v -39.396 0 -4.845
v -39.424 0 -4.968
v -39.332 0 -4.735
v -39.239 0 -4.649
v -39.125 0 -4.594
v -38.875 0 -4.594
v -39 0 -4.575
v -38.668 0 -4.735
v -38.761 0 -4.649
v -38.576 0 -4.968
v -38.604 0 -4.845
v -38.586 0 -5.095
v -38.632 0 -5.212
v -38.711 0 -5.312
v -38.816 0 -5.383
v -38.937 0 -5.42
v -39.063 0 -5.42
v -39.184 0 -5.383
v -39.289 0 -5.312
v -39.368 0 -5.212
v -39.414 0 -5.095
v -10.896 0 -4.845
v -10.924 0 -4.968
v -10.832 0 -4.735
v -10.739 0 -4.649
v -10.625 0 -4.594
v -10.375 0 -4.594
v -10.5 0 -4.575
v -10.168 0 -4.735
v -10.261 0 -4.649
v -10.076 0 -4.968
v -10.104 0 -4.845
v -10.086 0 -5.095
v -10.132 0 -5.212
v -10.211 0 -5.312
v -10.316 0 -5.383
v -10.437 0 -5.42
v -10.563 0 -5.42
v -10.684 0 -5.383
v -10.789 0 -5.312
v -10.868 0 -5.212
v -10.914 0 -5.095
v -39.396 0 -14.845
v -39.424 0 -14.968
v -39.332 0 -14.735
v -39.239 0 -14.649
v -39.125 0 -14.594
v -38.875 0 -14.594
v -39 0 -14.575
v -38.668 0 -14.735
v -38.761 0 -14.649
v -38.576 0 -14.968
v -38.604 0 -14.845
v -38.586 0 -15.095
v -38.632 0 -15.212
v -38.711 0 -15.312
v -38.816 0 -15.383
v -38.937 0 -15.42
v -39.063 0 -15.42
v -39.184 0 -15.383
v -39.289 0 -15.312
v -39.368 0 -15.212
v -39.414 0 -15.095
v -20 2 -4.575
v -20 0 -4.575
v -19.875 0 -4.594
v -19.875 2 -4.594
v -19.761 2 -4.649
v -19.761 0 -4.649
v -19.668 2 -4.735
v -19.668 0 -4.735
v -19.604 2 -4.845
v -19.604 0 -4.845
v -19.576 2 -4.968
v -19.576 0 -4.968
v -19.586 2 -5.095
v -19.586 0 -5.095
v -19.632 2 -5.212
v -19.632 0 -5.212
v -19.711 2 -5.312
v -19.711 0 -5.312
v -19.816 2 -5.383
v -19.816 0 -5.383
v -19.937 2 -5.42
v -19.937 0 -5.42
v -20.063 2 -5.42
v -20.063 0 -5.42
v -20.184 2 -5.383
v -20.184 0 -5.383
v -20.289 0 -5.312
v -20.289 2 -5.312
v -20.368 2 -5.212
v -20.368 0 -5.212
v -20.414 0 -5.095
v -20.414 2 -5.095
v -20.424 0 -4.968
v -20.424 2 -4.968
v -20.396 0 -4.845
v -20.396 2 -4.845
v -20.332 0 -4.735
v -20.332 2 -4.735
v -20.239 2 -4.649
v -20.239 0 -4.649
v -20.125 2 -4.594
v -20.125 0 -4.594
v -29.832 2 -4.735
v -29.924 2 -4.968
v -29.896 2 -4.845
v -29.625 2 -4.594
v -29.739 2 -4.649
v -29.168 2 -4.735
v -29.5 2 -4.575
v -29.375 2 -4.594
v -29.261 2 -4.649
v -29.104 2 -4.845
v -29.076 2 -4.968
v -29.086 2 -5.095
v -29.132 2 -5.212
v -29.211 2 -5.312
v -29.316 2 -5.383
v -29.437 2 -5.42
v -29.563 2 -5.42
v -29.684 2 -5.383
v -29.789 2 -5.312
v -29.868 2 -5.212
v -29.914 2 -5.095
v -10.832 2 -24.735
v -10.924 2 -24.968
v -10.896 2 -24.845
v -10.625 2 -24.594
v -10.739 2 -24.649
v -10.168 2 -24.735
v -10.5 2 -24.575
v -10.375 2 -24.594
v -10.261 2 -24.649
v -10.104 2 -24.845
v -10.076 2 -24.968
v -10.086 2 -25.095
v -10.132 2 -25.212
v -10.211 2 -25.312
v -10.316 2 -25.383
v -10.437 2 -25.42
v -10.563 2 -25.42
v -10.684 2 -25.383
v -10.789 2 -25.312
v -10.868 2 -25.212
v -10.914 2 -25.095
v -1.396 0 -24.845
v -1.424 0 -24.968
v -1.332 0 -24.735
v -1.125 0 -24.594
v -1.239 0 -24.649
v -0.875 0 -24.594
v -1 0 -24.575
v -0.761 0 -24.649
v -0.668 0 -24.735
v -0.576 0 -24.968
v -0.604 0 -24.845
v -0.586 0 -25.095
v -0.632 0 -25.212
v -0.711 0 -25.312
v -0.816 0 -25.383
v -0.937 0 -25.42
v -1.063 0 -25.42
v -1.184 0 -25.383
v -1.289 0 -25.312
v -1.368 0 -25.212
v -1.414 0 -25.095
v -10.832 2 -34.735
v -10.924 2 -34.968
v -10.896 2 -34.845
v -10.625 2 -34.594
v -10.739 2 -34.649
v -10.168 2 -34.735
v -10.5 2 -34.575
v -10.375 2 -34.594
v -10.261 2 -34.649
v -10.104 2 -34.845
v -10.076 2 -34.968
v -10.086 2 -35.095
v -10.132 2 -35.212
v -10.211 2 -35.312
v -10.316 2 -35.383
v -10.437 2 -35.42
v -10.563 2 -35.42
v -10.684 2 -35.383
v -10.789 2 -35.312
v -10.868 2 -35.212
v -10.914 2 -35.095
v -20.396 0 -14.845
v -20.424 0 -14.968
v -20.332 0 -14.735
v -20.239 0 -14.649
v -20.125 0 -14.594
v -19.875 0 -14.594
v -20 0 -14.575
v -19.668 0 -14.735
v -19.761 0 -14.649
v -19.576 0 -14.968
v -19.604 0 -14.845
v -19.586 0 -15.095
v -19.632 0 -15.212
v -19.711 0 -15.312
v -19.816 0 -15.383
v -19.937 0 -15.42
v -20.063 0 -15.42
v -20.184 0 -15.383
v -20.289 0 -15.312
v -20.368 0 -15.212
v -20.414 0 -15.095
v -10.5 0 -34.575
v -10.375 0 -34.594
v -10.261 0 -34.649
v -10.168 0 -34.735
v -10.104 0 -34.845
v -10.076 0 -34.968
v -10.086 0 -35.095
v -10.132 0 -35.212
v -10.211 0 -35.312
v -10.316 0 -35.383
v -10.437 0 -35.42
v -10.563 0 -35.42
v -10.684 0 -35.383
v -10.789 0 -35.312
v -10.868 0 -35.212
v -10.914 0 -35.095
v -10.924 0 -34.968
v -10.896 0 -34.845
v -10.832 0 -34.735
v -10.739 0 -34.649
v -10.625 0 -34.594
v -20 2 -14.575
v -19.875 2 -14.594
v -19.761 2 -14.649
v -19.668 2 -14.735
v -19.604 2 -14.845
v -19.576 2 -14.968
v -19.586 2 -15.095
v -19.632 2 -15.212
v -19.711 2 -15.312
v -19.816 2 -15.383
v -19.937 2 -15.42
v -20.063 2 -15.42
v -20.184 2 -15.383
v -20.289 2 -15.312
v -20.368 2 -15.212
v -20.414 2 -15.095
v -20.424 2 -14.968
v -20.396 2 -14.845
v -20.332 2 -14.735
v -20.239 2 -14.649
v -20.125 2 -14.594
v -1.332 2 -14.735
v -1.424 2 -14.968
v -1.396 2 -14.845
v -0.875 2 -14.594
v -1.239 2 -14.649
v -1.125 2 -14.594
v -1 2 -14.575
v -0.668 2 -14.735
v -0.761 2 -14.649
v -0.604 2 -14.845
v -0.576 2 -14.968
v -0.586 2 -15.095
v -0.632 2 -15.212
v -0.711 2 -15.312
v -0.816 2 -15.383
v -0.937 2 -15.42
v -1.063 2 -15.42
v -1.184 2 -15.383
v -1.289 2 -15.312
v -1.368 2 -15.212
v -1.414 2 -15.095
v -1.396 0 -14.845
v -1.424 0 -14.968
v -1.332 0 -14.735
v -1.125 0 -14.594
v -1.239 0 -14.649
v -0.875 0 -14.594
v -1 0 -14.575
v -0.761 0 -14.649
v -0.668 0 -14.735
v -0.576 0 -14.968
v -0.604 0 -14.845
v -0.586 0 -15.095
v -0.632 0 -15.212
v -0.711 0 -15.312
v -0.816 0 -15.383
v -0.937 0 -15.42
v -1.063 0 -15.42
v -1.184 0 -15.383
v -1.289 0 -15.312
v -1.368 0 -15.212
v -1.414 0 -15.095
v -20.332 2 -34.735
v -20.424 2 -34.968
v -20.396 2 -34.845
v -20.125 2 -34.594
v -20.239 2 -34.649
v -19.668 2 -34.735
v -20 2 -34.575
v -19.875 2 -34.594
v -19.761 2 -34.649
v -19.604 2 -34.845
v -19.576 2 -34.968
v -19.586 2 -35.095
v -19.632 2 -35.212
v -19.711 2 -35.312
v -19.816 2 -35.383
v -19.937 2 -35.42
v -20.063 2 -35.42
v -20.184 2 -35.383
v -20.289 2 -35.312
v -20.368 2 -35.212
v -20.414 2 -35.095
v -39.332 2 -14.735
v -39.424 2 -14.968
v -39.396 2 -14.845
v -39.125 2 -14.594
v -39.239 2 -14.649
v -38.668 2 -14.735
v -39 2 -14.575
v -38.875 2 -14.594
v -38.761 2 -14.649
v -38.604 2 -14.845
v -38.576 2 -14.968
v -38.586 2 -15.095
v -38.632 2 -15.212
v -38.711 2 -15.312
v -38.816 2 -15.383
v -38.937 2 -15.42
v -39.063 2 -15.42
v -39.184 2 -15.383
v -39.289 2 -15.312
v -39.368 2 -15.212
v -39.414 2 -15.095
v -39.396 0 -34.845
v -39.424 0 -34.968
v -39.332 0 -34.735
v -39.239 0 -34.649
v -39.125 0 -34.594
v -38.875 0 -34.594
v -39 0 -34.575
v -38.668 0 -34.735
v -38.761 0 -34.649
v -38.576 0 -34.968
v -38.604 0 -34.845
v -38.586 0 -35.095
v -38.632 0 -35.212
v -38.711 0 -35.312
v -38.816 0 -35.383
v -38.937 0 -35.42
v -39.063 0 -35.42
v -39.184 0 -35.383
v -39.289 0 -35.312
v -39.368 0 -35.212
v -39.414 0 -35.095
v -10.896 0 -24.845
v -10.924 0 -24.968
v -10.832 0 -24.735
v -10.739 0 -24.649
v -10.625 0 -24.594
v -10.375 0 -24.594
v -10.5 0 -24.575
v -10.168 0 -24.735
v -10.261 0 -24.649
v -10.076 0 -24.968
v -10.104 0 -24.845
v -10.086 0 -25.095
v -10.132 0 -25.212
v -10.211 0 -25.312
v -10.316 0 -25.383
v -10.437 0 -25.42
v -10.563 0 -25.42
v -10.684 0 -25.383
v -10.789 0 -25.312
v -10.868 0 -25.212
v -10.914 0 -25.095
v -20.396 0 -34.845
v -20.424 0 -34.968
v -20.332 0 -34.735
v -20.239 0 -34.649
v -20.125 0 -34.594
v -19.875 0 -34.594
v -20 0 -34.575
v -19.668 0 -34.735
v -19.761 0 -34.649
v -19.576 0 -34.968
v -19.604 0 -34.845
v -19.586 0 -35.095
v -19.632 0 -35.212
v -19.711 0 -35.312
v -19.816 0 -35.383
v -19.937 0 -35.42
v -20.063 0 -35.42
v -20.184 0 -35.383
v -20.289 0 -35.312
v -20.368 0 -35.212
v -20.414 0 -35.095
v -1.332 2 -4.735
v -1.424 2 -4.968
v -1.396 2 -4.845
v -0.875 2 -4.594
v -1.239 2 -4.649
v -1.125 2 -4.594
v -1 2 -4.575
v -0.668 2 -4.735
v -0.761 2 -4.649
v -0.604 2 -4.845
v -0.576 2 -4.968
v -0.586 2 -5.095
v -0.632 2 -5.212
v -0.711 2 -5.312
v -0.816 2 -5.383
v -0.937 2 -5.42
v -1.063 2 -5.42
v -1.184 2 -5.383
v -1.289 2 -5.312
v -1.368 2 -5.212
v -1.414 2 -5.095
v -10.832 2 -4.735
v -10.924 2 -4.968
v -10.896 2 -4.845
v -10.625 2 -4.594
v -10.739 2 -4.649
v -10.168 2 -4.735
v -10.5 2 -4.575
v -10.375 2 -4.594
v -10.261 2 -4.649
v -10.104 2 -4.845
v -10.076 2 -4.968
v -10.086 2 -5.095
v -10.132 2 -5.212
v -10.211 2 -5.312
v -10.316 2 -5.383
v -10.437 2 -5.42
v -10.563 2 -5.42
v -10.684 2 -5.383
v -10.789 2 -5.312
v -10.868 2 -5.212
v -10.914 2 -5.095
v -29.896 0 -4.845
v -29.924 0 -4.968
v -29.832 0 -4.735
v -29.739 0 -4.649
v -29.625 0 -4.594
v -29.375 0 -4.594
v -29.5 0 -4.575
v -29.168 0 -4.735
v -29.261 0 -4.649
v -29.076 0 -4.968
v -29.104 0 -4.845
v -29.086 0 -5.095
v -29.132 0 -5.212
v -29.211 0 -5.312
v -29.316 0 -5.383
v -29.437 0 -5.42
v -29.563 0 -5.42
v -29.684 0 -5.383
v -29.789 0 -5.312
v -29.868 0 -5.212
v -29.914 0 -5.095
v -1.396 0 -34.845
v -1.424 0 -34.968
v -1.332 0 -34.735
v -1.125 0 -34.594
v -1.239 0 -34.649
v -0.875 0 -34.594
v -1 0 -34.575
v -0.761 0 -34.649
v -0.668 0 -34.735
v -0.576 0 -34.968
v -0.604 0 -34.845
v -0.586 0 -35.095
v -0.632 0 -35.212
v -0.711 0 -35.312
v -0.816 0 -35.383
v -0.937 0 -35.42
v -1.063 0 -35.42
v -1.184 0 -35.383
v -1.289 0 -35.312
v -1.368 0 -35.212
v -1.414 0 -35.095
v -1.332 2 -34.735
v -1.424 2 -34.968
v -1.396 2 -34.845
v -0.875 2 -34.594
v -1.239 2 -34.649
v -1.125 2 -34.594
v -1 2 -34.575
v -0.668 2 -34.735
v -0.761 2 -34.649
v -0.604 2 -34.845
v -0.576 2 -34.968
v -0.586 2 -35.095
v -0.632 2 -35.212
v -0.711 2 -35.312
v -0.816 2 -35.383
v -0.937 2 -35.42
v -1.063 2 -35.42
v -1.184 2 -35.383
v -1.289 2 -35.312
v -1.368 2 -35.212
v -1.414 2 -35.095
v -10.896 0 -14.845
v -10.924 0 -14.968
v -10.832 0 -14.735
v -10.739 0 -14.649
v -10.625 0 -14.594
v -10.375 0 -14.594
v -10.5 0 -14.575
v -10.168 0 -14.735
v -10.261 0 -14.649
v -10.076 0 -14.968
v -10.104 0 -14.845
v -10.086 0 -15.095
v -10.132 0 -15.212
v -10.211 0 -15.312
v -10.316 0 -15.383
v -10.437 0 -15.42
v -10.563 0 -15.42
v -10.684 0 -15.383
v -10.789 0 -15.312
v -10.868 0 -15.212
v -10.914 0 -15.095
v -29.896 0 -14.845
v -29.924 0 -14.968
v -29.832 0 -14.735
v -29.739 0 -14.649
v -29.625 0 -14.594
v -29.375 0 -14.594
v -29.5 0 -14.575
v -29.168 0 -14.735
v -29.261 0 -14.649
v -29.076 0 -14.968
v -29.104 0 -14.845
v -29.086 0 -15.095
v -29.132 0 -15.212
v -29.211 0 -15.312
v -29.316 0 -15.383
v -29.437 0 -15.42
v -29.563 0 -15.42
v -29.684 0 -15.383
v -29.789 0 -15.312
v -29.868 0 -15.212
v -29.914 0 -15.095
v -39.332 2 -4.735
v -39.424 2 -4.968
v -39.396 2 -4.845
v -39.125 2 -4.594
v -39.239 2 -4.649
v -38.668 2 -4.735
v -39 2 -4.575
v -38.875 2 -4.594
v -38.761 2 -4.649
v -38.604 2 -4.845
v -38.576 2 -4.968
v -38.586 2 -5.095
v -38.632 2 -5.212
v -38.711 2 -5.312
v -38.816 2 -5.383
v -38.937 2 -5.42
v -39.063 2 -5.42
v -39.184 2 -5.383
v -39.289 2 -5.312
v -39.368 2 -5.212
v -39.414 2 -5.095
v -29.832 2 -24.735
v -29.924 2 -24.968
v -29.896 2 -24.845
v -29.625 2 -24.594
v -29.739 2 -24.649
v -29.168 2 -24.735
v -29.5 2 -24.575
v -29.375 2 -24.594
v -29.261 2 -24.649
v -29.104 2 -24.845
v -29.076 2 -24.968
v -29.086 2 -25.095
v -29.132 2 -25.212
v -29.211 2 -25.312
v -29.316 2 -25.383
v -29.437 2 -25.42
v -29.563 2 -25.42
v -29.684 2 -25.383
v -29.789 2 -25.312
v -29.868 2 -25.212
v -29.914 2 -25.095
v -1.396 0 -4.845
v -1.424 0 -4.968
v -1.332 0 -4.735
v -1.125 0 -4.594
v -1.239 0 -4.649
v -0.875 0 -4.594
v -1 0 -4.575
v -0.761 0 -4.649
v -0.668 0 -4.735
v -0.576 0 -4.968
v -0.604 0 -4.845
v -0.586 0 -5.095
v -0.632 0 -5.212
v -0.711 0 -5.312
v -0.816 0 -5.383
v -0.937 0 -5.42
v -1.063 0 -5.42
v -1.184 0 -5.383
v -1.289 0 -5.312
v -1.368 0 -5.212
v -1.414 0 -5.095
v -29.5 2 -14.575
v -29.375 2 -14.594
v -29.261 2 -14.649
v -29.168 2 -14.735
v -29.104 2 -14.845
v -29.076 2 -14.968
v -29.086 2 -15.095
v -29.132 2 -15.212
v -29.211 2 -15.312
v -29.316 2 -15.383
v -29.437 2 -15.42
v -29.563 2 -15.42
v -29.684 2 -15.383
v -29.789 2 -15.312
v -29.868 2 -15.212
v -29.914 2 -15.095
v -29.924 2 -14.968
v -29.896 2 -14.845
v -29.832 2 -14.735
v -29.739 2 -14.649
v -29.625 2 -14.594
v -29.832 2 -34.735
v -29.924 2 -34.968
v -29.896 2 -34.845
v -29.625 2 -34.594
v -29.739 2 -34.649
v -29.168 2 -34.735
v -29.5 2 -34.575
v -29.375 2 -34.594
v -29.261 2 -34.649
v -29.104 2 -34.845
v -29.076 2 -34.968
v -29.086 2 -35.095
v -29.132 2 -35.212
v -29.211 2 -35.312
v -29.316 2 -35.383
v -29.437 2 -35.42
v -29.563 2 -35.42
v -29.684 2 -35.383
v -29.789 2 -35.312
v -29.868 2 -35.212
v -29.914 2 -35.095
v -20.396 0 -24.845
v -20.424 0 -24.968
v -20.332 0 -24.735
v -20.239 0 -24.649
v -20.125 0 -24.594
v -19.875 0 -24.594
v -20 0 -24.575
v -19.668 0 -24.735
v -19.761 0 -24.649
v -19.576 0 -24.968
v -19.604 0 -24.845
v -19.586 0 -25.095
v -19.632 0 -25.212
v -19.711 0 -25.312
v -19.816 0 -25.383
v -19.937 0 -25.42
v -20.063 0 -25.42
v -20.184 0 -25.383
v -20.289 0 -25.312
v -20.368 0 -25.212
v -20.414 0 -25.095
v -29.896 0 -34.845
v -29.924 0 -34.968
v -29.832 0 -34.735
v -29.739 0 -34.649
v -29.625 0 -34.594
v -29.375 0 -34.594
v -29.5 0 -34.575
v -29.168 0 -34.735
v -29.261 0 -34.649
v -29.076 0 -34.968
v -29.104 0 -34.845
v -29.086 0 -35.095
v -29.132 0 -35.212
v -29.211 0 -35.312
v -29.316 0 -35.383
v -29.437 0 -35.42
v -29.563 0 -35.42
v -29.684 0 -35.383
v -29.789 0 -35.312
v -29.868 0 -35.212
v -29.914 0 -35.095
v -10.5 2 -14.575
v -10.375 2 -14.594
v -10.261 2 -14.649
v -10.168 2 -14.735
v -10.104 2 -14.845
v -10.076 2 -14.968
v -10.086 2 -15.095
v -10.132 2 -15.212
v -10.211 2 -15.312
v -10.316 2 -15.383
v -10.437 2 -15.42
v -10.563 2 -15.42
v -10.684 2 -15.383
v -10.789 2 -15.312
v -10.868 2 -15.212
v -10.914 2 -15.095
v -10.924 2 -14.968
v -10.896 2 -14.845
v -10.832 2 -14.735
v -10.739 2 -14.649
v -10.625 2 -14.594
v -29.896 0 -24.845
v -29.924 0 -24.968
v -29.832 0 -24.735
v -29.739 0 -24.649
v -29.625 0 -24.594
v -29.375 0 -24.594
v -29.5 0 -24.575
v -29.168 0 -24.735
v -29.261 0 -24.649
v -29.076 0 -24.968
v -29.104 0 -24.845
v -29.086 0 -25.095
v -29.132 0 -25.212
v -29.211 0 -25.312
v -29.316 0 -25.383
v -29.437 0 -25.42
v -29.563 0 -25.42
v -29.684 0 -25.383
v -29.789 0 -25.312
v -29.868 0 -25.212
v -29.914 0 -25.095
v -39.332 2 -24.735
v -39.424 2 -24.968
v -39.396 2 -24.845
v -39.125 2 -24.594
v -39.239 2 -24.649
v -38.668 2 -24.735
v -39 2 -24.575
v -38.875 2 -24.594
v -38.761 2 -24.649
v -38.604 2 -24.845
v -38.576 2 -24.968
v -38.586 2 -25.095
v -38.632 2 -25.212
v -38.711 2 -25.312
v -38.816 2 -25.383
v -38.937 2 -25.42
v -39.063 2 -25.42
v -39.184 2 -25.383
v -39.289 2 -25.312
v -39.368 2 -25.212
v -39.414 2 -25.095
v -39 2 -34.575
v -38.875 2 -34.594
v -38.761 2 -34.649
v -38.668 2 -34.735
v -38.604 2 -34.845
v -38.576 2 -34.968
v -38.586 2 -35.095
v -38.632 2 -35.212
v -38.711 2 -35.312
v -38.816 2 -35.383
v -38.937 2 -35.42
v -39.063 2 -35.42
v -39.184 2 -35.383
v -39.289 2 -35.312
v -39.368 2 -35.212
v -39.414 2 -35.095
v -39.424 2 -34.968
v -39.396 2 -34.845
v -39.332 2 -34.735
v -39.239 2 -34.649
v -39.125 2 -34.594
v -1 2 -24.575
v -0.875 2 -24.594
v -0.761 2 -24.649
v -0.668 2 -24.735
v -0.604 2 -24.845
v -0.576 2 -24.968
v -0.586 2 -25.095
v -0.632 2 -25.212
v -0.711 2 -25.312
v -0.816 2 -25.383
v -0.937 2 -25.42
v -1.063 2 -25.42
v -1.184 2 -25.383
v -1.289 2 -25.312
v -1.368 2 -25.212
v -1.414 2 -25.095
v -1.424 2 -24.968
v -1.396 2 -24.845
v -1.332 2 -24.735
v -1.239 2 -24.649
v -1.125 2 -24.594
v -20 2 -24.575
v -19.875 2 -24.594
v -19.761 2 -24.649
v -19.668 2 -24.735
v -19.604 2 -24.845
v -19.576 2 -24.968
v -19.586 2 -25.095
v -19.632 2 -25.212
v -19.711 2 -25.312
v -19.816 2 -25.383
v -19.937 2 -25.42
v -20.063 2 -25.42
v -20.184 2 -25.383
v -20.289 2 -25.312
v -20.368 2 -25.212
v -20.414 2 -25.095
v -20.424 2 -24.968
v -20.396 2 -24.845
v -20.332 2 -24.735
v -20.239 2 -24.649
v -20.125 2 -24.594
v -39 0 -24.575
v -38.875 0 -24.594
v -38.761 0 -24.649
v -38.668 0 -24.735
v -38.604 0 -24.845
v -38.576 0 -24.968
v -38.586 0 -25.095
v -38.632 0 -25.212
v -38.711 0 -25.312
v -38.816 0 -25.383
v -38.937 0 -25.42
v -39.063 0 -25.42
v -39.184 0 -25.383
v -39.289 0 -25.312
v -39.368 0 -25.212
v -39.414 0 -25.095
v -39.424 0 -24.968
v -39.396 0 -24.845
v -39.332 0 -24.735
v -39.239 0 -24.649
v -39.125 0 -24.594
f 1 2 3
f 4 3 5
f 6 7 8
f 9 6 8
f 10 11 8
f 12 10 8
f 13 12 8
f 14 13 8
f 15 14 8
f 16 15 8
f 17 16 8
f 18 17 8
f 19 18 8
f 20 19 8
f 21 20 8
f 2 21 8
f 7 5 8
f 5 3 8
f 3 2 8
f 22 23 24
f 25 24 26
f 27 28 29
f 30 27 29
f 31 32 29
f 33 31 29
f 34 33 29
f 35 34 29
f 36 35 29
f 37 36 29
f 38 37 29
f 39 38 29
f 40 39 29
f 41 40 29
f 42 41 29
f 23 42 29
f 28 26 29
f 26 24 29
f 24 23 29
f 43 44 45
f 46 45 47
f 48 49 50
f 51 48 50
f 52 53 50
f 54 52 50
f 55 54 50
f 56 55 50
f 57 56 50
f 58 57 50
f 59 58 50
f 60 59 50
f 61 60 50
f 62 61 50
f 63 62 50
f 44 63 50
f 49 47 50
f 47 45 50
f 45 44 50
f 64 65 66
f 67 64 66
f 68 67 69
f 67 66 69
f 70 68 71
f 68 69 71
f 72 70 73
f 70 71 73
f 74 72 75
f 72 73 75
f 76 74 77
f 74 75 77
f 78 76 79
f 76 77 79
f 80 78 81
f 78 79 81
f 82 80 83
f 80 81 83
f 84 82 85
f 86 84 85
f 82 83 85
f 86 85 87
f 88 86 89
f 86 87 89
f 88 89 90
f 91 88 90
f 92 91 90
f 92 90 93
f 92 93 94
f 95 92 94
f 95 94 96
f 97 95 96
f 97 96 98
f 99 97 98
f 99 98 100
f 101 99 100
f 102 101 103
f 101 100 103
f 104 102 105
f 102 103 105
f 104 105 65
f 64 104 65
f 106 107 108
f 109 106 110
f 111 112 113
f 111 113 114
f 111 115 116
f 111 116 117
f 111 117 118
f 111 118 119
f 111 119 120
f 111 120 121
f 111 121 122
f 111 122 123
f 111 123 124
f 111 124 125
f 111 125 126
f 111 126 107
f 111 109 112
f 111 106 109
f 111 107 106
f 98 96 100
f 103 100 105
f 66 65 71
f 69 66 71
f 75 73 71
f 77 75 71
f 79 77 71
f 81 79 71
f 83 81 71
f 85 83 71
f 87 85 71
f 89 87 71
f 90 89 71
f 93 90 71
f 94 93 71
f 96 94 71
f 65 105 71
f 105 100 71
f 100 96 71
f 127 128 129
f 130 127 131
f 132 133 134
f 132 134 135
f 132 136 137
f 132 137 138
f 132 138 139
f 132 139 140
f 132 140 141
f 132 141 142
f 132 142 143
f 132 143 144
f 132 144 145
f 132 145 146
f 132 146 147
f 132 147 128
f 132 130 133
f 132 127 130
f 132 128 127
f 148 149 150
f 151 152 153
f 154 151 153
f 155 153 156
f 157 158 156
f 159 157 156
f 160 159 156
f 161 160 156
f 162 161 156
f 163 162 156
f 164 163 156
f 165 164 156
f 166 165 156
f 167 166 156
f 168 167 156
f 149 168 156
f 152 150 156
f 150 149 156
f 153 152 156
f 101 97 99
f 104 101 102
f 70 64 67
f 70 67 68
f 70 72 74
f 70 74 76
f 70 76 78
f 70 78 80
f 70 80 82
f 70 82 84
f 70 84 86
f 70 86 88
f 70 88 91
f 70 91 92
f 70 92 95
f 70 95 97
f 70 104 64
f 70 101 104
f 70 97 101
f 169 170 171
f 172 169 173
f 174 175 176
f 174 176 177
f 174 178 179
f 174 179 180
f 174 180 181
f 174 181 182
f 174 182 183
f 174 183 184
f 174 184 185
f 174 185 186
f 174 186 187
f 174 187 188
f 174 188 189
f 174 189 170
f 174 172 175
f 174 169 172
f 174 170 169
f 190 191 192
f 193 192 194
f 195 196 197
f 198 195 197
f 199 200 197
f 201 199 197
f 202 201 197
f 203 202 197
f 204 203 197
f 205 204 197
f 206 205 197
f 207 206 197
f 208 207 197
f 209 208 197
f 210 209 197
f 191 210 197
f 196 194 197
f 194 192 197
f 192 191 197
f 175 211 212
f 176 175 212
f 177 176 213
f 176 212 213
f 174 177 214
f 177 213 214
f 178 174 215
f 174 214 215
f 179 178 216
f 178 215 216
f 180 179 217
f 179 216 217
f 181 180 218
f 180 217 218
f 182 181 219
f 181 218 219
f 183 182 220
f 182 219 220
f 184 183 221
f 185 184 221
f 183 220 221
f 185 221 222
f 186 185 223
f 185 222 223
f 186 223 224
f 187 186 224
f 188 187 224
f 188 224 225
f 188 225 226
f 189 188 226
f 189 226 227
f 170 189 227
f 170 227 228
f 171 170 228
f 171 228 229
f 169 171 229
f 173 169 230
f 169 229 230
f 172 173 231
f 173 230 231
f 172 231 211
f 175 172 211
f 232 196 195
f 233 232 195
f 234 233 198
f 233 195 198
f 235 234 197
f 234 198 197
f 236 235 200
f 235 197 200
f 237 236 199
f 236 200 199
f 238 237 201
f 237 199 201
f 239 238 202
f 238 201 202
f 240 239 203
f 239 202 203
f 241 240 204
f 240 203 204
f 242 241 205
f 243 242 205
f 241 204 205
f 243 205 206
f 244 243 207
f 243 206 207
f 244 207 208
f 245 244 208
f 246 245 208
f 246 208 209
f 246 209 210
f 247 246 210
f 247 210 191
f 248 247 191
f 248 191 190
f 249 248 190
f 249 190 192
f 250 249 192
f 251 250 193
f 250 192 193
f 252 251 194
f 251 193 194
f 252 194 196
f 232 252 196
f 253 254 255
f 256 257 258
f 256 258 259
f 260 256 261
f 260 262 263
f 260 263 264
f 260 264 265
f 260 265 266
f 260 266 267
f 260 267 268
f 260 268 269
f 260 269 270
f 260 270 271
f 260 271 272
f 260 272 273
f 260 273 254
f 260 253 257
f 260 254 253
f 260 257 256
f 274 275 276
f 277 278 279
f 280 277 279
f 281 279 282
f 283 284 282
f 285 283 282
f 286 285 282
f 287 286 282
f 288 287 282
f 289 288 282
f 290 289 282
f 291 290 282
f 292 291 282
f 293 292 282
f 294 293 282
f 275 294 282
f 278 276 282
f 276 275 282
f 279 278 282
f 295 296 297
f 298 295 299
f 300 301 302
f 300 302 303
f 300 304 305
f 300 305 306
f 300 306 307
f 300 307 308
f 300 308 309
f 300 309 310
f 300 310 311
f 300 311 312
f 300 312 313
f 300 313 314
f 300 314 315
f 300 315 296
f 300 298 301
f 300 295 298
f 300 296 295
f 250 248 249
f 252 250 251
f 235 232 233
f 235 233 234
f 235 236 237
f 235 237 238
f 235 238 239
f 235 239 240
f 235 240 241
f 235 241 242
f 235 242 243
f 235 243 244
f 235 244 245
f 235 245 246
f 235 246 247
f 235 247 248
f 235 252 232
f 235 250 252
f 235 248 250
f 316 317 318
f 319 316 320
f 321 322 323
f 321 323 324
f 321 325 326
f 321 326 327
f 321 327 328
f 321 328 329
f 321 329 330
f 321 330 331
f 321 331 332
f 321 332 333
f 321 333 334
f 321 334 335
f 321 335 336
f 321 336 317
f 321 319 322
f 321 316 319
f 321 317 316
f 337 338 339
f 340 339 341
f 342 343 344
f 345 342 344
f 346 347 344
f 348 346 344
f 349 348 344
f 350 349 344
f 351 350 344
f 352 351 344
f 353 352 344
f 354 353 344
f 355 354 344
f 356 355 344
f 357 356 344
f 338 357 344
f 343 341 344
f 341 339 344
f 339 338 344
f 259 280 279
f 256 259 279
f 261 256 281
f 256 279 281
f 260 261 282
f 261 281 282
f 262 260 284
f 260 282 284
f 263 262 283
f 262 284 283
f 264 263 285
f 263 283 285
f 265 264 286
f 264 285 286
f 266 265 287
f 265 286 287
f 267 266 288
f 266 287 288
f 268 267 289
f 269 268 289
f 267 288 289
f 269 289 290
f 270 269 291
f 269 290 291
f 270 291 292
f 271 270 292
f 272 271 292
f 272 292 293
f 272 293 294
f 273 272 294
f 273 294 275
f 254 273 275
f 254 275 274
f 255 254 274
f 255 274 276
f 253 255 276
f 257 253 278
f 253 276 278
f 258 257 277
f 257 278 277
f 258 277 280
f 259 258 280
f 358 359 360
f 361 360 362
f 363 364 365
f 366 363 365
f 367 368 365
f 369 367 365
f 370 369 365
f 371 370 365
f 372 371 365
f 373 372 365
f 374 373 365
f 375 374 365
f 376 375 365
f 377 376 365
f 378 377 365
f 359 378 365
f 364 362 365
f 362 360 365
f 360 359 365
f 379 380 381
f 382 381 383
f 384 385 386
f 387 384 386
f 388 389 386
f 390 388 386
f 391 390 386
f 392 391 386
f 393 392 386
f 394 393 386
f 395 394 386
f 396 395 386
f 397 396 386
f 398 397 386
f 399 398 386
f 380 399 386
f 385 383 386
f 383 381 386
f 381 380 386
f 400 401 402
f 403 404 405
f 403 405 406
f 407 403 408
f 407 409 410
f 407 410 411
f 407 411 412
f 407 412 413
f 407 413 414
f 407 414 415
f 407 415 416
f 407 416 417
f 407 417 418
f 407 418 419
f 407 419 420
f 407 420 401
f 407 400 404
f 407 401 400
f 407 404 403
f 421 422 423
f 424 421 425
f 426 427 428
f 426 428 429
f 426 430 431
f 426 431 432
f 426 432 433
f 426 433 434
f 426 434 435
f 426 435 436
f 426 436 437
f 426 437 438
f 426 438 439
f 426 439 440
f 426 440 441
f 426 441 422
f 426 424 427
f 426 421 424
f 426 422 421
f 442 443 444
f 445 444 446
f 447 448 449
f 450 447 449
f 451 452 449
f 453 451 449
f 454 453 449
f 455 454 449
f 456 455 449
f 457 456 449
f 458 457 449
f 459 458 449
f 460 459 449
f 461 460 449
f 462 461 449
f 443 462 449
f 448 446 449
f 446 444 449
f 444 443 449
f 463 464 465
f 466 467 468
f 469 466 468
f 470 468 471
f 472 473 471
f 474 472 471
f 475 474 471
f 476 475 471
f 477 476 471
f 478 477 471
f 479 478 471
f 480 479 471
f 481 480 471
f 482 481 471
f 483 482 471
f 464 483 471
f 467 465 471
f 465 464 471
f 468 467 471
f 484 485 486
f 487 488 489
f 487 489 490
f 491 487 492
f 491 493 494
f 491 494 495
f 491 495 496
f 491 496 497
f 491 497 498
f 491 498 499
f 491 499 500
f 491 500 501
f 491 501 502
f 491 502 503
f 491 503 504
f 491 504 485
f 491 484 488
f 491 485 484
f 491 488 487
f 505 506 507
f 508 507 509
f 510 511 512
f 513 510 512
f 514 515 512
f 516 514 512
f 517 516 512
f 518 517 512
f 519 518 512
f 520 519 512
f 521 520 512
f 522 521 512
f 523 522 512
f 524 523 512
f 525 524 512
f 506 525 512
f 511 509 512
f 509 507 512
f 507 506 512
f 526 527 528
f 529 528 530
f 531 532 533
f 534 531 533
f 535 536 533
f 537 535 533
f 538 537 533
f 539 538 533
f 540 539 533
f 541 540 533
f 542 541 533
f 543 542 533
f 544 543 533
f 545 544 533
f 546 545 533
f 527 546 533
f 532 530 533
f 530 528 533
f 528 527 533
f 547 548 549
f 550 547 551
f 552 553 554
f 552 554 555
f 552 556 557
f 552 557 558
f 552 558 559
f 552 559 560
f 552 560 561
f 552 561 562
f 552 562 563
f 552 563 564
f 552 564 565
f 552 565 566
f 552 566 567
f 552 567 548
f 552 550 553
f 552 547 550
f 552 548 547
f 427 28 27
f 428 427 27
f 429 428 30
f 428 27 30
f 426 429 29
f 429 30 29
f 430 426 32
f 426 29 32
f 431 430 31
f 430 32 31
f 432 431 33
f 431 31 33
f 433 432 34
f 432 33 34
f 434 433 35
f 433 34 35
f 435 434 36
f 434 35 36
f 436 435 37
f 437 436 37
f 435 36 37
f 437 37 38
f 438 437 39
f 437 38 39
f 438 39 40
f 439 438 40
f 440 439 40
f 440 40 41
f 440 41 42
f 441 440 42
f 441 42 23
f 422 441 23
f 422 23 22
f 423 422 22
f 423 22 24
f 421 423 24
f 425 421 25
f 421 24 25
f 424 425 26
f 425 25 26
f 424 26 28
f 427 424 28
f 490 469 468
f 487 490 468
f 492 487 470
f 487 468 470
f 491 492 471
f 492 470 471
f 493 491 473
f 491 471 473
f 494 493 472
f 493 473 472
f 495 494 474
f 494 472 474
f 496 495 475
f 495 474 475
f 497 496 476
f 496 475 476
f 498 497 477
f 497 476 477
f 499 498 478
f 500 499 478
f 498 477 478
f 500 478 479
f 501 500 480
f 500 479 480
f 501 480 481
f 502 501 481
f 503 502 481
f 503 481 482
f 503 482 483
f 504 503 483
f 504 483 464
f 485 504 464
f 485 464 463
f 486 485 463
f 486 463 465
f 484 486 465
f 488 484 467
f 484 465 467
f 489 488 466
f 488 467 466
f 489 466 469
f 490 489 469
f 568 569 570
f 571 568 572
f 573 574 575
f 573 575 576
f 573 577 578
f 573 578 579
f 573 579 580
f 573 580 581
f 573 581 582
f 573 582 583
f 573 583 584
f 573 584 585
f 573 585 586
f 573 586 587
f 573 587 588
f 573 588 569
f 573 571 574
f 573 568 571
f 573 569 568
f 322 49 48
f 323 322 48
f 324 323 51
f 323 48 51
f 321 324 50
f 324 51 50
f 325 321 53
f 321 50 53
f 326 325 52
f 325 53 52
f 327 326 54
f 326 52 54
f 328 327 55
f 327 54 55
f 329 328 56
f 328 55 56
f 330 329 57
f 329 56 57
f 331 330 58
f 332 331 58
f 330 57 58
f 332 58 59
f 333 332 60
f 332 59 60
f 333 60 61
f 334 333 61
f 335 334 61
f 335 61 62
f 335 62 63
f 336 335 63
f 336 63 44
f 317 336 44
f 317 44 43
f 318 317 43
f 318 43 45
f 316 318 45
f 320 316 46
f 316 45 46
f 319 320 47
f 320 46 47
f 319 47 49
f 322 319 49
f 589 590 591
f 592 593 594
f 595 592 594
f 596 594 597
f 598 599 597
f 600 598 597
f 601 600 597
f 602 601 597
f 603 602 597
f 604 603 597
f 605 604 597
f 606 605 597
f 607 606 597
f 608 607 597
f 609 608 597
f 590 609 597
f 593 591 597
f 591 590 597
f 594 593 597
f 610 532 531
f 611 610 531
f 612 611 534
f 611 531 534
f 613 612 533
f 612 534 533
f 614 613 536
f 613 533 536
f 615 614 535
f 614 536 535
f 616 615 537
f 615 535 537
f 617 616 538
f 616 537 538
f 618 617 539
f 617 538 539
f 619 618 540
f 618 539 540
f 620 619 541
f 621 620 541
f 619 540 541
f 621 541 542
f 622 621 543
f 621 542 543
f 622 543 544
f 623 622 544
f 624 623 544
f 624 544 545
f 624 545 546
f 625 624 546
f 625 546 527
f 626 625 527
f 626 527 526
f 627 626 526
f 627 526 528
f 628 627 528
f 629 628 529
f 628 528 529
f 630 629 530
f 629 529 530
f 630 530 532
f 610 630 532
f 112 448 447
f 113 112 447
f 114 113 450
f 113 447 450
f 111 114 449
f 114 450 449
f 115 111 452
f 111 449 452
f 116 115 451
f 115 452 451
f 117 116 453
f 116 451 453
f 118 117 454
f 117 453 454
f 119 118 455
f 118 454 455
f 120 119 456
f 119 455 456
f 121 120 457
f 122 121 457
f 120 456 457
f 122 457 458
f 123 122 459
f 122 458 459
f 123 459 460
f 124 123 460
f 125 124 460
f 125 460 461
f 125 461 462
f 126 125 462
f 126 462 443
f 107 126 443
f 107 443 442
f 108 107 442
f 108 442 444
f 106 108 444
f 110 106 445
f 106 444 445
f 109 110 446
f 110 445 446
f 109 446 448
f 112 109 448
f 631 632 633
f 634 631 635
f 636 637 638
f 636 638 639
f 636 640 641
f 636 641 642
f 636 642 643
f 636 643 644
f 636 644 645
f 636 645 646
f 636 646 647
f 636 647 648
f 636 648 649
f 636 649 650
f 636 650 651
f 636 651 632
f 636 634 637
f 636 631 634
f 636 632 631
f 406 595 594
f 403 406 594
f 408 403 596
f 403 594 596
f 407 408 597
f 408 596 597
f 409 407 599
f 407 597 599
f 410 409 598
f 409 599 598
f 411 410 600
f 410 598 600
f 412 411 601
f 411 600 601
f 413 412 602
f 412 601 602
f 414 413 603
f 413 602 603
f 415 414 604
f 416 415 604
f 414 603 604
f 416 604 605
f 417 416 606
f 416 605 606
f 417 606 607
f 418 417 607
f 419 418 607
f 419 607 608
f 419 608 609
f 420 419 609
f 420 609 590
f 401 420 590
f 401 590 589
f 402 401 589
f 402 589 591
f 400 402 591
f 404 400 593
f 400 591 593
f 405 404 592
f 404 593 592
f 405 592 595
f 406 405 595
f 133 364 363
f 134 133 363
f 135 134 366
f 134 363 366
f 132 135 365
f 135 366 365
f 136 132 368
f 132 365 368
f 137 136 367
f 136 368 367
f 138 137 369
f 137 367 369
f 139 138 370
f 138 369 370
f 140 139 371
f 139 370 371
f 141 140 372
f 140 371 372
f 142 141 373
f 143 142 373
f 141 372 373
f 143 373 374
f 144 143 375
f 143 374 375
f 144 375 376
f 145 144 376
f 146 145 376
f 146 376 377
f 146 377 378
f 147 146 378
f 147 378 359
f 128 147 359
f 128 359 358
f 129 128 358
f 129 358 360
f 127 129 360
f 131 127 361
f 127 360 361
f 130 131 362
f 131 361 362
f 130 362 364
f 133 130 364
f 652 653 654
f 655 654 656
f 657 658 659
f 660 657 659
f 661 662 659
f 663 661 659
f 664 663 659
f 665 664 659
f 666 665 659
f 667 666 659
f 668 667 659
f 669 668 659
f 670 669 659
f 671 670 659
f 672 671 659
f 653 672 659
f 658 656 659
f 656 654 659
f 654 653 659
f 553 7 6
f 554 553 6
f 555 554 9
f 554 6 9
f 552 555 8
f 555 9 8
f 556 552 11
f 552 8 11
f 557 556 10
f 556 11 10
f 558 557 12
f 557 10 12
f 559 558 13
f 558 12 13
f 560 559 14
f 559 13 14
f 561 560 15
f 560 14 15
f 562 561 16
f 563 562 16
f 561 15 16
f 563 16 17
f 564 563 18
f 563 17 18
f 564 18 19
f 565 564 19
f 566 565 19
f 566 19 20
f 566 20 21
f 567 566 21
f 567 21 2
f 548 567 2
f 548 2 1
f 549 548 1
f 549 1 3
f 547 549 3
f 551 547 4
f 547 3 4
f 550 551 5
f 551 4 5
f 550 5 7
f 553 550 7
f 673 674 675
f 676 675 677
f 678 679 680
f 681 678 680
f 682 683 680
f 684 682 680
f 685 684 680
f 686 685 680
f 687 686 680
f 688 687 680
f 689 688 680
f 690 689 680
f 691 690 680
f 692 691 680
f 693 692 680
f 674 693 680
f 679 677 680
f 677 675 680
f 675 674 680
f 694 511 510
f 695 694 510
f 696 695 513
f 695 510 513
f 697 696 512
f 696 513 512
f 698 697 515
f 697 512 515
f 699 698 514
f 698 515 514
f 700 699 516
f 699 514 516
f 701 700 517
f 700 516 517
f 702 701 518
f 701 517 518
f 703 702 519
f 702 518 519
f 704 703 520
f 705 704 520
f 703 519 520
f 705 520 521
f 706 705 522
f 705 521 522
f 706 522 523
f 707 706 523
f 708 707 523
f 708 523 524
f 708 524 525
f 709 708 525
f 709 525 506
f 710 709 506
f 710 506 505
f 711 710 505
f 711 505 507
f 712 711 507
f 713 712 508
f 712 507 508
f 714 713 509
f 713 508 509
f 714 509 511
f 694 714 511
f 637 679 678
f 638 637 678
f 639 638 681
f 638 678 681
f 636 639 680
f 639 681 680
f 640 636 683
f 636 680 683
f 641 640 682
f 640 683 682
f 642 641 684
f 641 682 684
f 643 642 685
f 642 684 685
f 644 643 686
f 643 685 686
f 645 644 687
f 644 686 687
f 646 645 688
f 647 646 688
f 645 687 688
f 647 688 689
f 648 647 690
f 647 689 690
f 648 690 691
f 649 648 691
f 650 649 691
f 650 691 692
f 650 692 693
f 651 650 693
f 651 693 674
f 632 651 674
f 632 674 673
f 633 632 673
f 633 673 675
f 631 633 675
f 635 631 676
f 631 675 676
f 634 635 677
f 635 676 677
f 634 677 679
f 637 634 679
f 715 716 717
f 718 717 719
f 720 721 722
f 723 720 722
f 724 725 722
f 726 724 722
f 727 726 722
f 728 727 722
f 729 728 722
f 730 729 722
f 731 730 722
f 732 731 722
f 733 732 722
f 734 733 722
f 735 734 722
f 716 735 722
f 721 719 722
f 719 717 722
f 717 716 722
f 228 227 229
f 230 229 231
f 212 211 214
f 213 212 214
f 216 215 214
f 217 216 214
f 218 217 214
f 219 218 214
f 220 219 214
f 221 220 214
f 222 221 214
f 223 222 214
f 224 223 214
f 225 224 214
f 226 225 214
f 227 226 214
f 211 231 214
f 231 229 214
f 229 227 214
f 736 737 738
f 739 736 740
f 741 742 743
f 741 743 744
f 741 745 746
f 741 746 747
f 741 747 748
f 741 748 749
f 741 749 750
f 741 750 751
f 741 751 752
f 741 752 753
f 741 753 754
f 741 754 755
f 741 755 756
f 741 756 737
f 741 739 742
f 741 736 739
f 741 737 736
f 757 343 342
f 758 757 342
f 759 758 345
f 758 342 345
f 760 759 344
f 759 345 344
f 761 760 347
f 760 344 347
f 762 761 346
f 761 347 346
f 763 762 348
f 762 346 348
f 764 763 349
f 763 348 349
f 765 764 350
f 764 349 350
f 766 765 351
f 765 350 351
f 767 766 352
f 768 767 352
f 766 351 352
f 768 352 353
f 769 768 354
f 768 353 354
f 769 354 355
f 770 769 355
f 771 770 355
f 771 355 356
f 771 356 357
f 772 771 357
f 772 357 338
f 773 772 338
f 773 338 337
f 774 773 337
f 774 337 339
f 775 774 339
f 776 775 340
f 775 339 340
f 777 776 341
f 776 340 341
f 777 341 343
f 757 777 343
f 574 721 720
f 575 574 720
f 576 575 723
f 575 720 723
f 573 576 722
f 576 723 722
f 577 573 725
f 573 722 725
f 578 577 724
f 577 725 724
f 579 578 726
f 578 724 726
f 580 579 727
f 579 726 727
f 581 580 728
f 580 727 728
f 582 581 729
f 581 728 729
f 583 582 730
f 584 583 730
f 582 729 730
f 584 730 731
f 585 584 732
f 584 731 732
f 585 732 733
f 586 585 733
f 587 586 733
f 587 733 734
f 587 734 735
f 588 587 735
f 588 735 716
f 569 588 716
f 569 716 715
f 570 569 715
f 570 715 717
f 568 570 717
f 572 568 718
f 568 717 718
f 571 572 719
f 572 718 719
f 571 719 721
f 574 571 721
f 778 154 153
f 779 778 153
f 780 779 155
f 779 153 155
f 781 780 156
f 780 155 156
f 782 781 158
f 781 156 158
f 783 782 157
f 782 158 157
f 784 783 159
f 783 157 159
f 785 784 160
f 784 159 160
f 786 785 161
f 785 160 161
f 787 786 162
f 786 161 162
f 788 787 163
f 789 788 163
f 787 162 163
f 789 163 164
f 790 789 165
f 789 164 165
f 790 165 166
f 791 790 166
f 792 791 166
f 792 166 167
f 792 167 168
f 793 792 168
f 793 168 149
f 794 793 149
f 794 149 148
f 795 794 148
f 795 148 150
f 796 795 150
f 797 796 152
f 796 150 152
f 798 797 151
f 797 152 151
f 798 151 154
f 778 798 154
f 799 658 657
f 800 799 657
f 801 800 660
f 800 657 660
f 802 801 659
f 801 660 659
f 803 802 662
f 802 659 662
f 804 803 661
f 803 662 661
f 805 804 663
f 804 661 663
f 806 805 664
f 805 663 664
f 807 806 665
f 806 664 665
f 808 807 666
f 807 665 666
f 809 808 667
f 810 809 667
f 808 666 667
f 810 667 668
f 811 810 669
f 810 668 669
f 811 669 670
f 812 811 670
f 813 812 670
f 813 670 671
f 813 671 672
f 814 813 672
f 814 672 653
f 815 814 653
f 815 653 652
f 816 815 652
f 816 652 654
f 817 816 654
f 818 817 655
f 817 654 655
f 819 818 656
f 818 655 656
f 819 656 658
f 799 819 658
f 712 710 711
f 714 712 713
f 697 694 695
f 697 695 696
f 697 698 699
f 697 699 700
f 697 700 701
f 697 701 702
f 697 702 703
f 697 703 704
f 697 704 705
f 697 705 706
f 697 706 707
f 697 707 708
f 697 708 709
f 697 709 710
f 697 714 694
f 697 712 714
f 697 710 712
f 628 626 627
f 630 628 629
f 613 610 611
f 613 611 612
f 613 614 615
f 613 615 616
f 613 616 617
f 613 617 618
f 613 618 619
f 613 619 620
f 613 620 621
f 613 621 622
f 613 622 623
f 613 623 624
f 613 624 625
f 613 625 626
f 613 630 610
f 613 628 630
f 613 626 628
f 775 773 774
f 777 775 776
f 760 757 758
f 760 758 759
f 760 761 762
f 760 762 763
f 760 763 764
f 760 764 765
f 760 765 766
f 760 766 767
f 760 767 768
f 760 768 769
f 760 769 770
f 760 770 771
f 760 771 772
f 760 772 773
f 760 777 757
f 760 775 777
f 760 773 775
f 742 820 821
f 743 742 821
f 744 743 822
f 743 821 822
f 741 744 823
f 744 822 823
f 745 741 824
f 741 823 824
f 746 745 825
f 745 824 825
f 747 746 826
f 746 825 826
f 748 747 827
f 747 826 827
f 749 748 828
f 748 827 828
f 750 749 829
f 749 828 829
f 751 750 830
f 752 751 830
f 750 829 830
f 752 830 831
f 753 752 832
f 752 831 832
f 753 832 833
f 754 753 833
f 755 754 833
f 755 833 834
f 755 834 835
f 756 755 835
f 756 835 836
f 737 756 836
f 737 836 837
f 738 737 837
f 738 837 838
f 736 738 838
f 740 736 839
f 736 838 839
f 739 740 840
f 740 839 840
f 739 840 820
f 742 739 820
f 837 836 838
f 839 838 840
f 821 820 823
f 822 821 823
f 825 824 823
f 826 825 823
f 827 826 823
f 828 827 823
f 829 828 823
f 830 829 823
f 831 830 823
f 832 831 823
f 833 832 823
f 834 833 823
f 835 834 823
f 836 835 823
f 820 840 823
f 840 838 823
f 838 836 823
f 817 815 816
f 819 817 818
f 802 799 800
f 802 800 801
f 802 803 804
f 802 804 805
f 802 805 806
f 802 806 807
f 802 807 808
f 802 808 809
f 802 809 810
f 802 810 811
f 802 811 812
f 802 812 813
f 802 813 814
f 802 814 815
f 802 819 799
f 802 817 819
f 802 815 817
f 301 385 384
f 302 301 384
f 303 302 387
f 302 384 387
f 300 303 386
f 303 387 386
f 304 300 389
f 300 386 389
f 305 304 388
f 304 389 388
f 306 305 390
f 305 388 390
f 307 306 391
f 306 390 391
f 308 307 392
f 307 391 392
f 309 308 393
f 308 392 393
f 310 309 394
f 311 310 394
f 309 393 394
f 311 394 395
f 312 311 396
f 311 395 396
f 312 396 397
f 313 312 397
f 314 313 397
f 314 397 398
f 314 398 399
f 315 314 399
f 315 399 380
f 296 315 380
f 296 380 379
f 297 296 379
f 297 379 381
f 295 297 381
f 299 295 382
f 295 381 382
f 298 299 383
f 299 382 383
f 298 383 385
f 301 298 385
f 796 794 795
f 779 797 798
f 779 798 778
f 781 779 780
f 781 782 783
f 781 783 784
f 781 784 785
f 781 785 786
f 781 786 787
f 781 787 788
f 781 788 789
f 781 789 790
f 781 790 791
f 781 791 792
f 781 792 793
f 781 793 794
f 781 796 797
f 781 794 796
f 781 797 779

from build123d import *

# Parameters (mm, degrees)
SKETCH3_R              = 0.425
BOSS_EXTRUDE1_DEPTH    = 2
BOSS_EXTRUDE1_2_DEPTH  = 2
BOSS_EXTRUDE1_3_DEPTH  = 2
BOSS_EXTRUDE1_4_DEPTH  = 2
BOSS_EXTRUDE1_5_DEPTH  = 2
BOSS_EXTRUDE1_6_DEPTH  = 2
BOSS_EXTRUDE1_7_DEPTH  = 2
BOSS_EXTRUDE1_8_DEPTH  = 2
BOSS_EXTRUDE1_9_DEPTH  = 2
BOSS_EXTRUDE1_10_DEPTH = 2
BOSS_EXTRUDE1_11_DEPTH = 2
BOSS_EXTRUDE1_12_DEPTH = 2
BOSS_EXTRUDE1_13_DEPTH = 2
BOSS_EXTRUDE1_14_DEPTH = 2
BOSS_EXTRUDE1_15_DEPTH = 2
BOSS_EXTRUDE1_16_DEPTH = 2
BOSS_EXTRUDE1_17_DEPTH = 2
BOSS_EXTRUDE1_18_DEPTH = 2
BOSS_EXTRUDE1_19_DEPTH = 2
BOSS_EXTRUDE1_20_DEPTH = 2


with BuildPart() as part:
    # Sketch3 → Boss-Extrude1 (new body)
    with BuildSketch(Plane(origin=(0, 0, 0), x_dir=(1, 0, 0), z_dir=(0, 1, 0))):
        with Locations(Location((-39, 5, 0), (0, 0, 270))):
            Circle(SKETCH3_R)
    extrude(amount=BOSS_EXTRUDE1_DEPTH)


with BuildPart() as body_2:
    # Sketch3 → Boss-Extrude1 2 (new body)
    with BuildSketch(Plane(origin=(0, 0, 0), x_dir=(1, 0, 0), z_dir=(0, 1, 0))):
        with Locations(Location((-29.5, 5, 0), (0, 0, 270))):
            Circle(SKETCH3_R)
    extrude(amount=BOSS_EXTRUDE1_2_DEPTH)


with BuildPart() as body_3:
    # Sketch3 → Boss-Extrude1 3 (new body)
    with BuildSketch(Plane(origin=(0, 0, 0), x_dir=(1, 0, 0), z_dir=(0, 1, 0))):
        with Locations(Location((-20, 5, 0), (0, 0, 270))):
            Circle(SKETCH3_R)
    extrude(amount=BOSS_EXTRUDE1_3_DEPTH)


with BuildPart() as body_4:
    # Sketch3 → Boss-Extrude1 4 (new body)
    with BuildSketch(Plane(origin=(0, 0, 0), x_dir=(1, 0, 0), z_dir=(0, 1, 0))):
        with Locations(Location((-10.5, 5, 0), (0, 0, 270))):
            Circle(SKETCH3_R)
    extrude(amount=BOSS_EXTRUDE1_4_DEPTH)


with BuildPart() as body_5:
    # Sketch3 → Boss-Extrude1 5 (new body)
    with BuildSketch(Plane(origin=(0, 0, 0), x_dir=(1, 0, 0), z_dir=(0, 1, 0))):
        with Locations(Location((-1, 5, 0), (0, 0, 270))):
            Circle(SKETCH3_R)
    extrude(amount=BOSS_EXTRUDE1_5_DEPTH)


with BuildPart() as body_6:
    # Sketch3 → Boss-Extrude1 6 (new body)
    with BuildSketch(Plane(origin=(0, 0, 0), x_dir=(1, 0, 0), z_dir=(0, 1, 0))):
        with Locations(Location((-29.5, 15, 0), (0, 0, 270))):
            Circle(SKETCH3_R)
    extrude(amount=BOSS_EXTRUDE1_6_DEPTH)


with BuildPart() as body_7:
    # Sketch3 → Boss-Extrude1 7 (new body)
    with BuildSketch(Plane(origin=(0, 0, 0), x_dir=(1, 0, 0), z_dir=(0, 1, 0))):
        with Locations(Location((-20, 15, 0), (0, 0, 270))):
            Circle(SKETCH3_R)
    extrude(amount=BOSS_EXTRUDE1_7_DEPTH)


with BuildPart() as body_8:
    # Sketch3 → Boss-Extrude1 8 (new body)
    with BuildSketch(Plane(origin=(0, 0, 0), x_dir=(1, 0, 0), z_dir=(0, 1, 0))):
        with Locations(Location((-10.5, 15, 0), (0, 0, 270))):
            Circle(SKETCH3_R)
    extrude(amount=BOSS_EXTRUDE1_8_DEPTH)


with BuildPart() as body_9:
    # Sketch3 → Boss-Extrude1 9 (new body)
    with BuildSketch(Plane(origin=(0, 0, 0), x_dir=(1, 0, 0), z_dir=(0, 1, 0))):
        with Locations(Location((-1, 15, 0), (0, 0, 270))):
            Circle(SKETCH3_R)
    extrude(amount=BOSS_EXTRUDE1_9_DEPTH)


with BuildPart() as body_10:
    # Sketch3 → Boss-Extrude1 10 (new body)
    with BuildSketch(Plane(origin=(0, 0, 0), x_dir=(1, 0, 0), z_dir=(0, 1, 0))):
        with Locations(Location((-29.5, 25, 0), (0, 0, 270))):
            Circle(SKETCH3_R)
    extrude(amount=BOSS_EXTRUDE1_10_DEPTH)


with BuildPart() as body_11:
    # Sketch3 → Boss-Extrude1 11 (new body)
    with BuildSketch(Plane(origin=(0, 0, 0), x_dir=(1, 0, 0), z_dir=(0, 1, 0))):
        with Locations(Location((-20, 25, 0), (0, 0, 270))):
            Circle(SKETCH3_R)
    extrude(amount=BOSS_EXTRUDE1_11_DEPTH)


with BuildPart() as body_12:
    # Sketch3 → Boss-Extrude1 12 (new body)
    with BuildSketch(Plane(origin=(0, 0, 0), x_dir=(1, 0, 0), z_dir=(0, 1, 0))):
        with Locations(Location((-10.5, 25, 0), (0, 0, 270))):
            Circle(SKETCH3_R)
    extrude(amount=BOSS_EXTRUDE1_12_DEPTH)


with BuildPart() as body_13:
    # Sketch3 → Boss-Extrude1 13 (new body)
    with BuildSketch(Plane(origin=(0, 0, 0), x_dir=(1, 0, 0), z_dir=(0, 1, 0))):
        with Locations(Location((-1, 25, 0), (0, 0, 270))):
            Circle(SKETCH3_R)
    extrude(amount=BOSS_EXTRUDE1_13_DEPTH)


with BuildPart() as body_14:
    # Sketch3 → Boss-Extrude1 14 (new body)
    with BuildSketch(Plane(origin=(0, 0, 0), x_dir=(1, 0, 0), z_dir=(0, 1, 0))):
        with Locations(Location((-29.5, 35, 0), (0, 0, 270))):
            Circle(SKETCH3_R)
    extrude(amount=BOSS_EXTRUDE1_14_DEPTH)


with BuildPart() as body_15:
    # Sketch3 → Boss-Extrude1 15 (new body)
    with BuildSketch(Plane(origin=(0, 0, 0), x_dir=(1, 0, 0), z_dir=(0, 1, 0))):
        with Locations(Location((-20, 35, 0), (0, 0, 270))):
            Circle(SKETCH3_R)
    extrude(amount=BOSS_EXTRUDE1_15_DEPTH)


with BuildPart() as body_16:
    # Sketch3 → Boss-Extrude1 16 (new body)
    with BuildSketch(Plane(origin=(0, 0, 0), x_dir=(1, 0, 0), z_dir=(0, 1, 0))):
        with Locations(Location((-10.5, 35, 0), (0, 0, 270))):
            Circle(SKETCH3_R)
    extrude(amount=BOSS_EXTRUDE1_16_DEPTH)


with BuildPart() as body_17:
    # Sketch3 → Boss-Extrude1 17 (new body)
    with BuildSketch(Plane(origin=(0, 0, 0), x_dir=(1, 0, 0), z_dir=(0, 1, 0))):
        with Locations(Location((-1, 35, 0), (0, 0, 270))):
            Circle(SKETCH3_R)
    extrude(amount=BOSS_EXTRUDE1_17_DEPTH)


with BuildPart() as body_18:
    # Sketch3 → Boss-Extrude1 18 (new body)
    with BuildSketch(Plane(origin=(0, 0, 0), x_dir=(1, 0, 0), z_dir=(0, 1, 0))):
        with Locations(Location((-39, 15, 0), (0, 0, 270))):
            Circle(SKETCH3_R)
    extrude(amount=BOSS_EXTRUDE1_18_DEPTH)


with BuildPart() as body_19:
    # Sketch3 → Boss-Extrude1 19 (new body)
    with BuildSketch(Plane(origin=(0, 0, 0), x_dir=(1, 0, 0), z_dir=(0, 1, 0))):
        with Locations(Location((-39, 25, 0), (0, 0, 270))):
            Circle(SKETCH3_R)
    extrude(amount=BOSS_EXTRUDE1_19_DEPTH)


with BuildPart() as body_20:
    # Sketch3 → Boss-Extrude1 20 (new body)
    with BuildSketch(Plane(origin=(0, 0, 0), x_dir=(1, 0, 0), z_dir=(0, 1, 0))):
        with Locations(Location((-39, 35, 0), (0, 0, 270))):
            Circle(SKETCH3_R)
    extrude(amount=BOSS_EXTRUDE1_20_DEPTH)


solid = Compound([part.part, body_2.part, body_3.part, body_4.part, body_5.part, body_6.part, body_7.part, body_8.part, body_9.part, body_10.part, body_11.part, body_12.part, body_13.part, body_14.part, body_15.part, body_16.part, body_17.part, body_18.part, body_19.part, body_20.part])
